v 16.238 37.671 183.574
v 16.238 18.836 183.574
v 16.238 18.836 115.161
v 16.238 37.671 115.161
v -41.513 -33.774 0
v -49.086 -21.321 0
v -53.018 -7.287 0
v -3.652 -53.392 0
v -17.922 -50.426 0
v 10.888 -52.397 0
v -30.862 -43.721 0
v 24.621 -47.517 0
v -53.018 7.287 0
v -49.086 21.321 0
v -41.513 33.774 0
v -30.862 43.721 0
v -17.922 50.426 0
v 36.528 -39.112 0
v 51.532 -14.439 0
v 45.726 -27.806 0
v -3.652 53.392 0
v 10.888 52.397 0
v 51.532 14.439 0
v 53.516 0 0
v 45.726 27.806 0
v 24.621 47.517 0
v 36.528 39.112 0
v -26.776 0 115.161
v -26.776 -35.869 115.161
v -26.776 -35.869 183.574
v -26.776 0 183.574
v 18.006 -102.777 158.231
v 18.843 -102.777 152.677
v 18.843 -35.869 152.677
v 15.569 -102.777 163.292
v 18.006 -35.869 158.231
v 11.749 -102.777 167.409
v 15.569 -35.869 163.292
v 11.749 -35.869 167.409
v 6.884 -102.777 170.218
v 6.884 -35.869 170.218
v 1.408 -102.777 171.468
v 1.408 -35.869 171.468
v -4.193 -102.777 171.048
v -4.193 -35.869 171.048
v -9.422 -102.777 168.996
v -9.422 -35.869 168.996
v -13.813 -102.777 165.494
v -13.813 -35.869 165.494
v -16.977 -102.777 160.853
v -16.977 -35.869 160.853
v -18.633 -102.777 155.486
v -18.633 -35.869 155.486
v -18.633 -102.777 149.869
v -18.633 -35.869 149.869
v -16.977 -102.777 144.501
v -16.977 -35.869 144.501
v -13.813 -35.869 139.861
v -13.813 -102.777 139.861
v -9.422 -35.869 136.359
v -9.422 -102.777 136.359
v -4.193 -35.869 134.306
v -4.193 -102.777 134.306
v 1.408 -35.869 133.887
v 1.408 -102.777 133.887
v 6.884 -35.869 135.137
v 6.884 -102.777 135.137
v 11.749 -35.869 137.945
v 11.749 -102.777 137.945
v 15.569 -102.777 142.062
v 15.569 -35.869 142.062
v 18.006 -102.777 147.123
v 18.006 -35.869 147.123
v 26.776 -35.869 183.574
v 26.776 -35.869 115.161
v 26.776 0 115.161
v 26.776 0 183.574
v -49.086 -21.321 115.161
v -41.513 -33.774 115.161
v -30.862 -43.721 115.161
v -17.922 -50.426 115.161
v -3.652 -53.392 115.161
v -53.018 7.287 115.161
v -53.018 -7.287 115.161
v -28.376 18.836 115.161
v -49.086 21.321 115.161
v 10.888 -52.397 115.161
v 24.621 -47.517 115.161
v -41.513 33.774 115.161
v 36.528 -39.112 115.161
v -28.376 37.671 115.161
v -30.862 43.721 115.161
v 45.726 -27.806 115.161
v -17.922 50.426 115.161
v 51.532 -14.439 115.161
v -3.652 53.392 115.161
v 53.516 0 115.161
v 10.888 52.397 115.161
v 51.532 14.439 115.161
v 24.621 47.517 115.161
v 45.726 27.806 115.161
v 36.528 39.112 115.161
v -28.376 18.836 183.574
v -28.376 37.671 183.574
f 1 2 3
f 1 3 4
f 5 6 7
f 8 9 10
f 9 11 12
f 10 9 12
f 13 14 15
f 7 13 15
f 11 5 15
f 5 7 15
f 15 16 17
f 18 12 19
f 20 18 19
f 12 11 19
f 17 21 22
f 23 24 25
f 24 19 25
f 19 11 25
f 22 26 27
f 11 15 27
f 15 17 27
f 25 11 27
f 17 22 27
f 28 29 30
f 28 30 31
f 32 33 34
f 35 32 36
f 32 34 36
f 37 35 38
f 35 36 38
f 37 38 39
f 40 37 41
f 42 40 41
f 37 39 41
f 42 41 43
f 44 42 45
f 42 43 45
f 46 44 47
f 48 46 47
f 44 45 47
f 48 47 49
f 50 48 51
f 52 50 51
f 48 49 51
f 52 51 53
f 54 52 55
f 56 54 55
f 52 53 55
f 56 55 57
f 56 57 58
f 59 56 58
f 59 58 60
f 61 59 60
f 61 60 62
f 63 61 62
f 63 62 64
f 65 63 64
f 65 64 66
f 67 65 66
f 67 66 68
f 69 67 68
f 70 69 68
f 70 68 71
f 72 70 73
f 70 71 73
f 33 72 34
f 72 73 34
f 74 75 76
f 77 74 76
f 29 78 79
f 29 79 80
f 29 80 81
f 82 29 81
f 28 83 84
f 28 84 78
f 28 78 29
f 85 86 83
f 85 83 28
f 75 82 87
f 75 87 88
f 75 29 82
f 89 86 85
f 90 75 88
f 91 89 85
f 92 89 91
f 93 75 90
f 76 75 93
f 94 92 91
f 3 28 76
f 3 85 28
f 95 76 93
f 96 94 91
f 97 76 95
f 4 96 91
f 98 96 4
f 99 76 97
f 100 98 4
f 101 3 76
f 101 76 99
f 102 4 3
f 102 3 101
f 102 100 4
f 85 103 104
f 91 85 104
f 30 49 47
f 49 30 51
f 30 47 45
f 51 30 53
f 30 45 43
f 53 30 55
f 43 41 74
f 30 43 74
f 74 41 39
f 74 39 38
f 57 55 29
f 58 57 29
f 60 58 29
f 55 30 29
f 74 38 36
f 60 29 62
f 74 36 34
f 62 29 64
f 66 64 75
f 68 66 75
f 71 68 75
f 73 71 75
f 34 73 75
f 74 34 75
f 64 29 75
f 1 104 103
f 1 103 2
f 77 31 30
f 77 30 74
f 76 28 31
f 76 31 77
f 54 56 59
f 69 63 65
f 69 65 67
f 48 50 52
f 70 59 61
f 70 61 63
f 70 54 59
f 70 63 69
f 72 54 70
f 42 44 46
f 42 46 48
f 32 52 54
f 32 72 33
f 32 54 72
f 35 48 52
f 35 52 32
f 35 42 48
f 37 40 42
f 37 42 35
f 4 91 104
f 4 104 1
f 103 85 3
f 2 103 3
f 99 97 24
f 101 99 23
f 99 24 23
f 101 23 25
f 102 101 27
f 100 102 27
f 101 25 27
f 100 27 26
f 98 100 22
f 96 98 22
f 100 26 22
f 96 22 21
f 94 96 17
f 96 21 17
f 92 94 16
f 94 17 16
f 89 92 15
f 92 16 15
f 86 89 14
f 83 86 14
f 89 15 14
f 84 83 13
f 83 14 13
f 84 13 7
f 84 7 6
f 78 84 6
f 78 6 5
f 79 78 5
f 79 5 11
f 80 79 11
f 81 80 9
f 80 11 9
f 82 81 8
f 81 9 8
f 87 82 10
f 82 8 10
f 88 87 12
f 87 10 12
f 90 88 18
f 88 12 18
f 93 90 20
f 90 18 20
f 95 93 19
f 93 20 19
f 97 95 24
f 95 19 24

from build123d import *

# Parameters (mm, degrees)
F0_R     = 53.51649
F1_DEPTH = 115.161
F2_W     = 44.614081
F2_H     = 18.834734
F2_W_2   = 53.55269
F2_H_2   = 35.868514
F3_DEPTH = 68.41306
F4_R     = 18.843136
F5_DEPTH = 66.90822


with BuildPart() as f1:
    # F0 (on Top) → F1 (new body)
    with BuildSketch(Plane.XY):
        Circle(F0_R)
    extrude(amount=F1_DEPTH)

    # F2 (on face) → F3 (join)
    with BuildSketch(Plane.XY.offset(115.161)):
        with Locations((-6.069197, 28.253733)):
            Rectangle(F2_W, F2_H)
        with Locations((0, -17.934257)):
            Rectangle(F2_W_2, F2_H_2)
    extrude(amount=F3_DEPTH)

    # F4 (on face) → F5 (join)
    with BuildSketch(Plane.XZ.offset(35.868514)):
        with Locations((0, 152.677178)):
            Circle(F4_R)
    extrude(amount=F5_DEPTH)


solid = f1.part
